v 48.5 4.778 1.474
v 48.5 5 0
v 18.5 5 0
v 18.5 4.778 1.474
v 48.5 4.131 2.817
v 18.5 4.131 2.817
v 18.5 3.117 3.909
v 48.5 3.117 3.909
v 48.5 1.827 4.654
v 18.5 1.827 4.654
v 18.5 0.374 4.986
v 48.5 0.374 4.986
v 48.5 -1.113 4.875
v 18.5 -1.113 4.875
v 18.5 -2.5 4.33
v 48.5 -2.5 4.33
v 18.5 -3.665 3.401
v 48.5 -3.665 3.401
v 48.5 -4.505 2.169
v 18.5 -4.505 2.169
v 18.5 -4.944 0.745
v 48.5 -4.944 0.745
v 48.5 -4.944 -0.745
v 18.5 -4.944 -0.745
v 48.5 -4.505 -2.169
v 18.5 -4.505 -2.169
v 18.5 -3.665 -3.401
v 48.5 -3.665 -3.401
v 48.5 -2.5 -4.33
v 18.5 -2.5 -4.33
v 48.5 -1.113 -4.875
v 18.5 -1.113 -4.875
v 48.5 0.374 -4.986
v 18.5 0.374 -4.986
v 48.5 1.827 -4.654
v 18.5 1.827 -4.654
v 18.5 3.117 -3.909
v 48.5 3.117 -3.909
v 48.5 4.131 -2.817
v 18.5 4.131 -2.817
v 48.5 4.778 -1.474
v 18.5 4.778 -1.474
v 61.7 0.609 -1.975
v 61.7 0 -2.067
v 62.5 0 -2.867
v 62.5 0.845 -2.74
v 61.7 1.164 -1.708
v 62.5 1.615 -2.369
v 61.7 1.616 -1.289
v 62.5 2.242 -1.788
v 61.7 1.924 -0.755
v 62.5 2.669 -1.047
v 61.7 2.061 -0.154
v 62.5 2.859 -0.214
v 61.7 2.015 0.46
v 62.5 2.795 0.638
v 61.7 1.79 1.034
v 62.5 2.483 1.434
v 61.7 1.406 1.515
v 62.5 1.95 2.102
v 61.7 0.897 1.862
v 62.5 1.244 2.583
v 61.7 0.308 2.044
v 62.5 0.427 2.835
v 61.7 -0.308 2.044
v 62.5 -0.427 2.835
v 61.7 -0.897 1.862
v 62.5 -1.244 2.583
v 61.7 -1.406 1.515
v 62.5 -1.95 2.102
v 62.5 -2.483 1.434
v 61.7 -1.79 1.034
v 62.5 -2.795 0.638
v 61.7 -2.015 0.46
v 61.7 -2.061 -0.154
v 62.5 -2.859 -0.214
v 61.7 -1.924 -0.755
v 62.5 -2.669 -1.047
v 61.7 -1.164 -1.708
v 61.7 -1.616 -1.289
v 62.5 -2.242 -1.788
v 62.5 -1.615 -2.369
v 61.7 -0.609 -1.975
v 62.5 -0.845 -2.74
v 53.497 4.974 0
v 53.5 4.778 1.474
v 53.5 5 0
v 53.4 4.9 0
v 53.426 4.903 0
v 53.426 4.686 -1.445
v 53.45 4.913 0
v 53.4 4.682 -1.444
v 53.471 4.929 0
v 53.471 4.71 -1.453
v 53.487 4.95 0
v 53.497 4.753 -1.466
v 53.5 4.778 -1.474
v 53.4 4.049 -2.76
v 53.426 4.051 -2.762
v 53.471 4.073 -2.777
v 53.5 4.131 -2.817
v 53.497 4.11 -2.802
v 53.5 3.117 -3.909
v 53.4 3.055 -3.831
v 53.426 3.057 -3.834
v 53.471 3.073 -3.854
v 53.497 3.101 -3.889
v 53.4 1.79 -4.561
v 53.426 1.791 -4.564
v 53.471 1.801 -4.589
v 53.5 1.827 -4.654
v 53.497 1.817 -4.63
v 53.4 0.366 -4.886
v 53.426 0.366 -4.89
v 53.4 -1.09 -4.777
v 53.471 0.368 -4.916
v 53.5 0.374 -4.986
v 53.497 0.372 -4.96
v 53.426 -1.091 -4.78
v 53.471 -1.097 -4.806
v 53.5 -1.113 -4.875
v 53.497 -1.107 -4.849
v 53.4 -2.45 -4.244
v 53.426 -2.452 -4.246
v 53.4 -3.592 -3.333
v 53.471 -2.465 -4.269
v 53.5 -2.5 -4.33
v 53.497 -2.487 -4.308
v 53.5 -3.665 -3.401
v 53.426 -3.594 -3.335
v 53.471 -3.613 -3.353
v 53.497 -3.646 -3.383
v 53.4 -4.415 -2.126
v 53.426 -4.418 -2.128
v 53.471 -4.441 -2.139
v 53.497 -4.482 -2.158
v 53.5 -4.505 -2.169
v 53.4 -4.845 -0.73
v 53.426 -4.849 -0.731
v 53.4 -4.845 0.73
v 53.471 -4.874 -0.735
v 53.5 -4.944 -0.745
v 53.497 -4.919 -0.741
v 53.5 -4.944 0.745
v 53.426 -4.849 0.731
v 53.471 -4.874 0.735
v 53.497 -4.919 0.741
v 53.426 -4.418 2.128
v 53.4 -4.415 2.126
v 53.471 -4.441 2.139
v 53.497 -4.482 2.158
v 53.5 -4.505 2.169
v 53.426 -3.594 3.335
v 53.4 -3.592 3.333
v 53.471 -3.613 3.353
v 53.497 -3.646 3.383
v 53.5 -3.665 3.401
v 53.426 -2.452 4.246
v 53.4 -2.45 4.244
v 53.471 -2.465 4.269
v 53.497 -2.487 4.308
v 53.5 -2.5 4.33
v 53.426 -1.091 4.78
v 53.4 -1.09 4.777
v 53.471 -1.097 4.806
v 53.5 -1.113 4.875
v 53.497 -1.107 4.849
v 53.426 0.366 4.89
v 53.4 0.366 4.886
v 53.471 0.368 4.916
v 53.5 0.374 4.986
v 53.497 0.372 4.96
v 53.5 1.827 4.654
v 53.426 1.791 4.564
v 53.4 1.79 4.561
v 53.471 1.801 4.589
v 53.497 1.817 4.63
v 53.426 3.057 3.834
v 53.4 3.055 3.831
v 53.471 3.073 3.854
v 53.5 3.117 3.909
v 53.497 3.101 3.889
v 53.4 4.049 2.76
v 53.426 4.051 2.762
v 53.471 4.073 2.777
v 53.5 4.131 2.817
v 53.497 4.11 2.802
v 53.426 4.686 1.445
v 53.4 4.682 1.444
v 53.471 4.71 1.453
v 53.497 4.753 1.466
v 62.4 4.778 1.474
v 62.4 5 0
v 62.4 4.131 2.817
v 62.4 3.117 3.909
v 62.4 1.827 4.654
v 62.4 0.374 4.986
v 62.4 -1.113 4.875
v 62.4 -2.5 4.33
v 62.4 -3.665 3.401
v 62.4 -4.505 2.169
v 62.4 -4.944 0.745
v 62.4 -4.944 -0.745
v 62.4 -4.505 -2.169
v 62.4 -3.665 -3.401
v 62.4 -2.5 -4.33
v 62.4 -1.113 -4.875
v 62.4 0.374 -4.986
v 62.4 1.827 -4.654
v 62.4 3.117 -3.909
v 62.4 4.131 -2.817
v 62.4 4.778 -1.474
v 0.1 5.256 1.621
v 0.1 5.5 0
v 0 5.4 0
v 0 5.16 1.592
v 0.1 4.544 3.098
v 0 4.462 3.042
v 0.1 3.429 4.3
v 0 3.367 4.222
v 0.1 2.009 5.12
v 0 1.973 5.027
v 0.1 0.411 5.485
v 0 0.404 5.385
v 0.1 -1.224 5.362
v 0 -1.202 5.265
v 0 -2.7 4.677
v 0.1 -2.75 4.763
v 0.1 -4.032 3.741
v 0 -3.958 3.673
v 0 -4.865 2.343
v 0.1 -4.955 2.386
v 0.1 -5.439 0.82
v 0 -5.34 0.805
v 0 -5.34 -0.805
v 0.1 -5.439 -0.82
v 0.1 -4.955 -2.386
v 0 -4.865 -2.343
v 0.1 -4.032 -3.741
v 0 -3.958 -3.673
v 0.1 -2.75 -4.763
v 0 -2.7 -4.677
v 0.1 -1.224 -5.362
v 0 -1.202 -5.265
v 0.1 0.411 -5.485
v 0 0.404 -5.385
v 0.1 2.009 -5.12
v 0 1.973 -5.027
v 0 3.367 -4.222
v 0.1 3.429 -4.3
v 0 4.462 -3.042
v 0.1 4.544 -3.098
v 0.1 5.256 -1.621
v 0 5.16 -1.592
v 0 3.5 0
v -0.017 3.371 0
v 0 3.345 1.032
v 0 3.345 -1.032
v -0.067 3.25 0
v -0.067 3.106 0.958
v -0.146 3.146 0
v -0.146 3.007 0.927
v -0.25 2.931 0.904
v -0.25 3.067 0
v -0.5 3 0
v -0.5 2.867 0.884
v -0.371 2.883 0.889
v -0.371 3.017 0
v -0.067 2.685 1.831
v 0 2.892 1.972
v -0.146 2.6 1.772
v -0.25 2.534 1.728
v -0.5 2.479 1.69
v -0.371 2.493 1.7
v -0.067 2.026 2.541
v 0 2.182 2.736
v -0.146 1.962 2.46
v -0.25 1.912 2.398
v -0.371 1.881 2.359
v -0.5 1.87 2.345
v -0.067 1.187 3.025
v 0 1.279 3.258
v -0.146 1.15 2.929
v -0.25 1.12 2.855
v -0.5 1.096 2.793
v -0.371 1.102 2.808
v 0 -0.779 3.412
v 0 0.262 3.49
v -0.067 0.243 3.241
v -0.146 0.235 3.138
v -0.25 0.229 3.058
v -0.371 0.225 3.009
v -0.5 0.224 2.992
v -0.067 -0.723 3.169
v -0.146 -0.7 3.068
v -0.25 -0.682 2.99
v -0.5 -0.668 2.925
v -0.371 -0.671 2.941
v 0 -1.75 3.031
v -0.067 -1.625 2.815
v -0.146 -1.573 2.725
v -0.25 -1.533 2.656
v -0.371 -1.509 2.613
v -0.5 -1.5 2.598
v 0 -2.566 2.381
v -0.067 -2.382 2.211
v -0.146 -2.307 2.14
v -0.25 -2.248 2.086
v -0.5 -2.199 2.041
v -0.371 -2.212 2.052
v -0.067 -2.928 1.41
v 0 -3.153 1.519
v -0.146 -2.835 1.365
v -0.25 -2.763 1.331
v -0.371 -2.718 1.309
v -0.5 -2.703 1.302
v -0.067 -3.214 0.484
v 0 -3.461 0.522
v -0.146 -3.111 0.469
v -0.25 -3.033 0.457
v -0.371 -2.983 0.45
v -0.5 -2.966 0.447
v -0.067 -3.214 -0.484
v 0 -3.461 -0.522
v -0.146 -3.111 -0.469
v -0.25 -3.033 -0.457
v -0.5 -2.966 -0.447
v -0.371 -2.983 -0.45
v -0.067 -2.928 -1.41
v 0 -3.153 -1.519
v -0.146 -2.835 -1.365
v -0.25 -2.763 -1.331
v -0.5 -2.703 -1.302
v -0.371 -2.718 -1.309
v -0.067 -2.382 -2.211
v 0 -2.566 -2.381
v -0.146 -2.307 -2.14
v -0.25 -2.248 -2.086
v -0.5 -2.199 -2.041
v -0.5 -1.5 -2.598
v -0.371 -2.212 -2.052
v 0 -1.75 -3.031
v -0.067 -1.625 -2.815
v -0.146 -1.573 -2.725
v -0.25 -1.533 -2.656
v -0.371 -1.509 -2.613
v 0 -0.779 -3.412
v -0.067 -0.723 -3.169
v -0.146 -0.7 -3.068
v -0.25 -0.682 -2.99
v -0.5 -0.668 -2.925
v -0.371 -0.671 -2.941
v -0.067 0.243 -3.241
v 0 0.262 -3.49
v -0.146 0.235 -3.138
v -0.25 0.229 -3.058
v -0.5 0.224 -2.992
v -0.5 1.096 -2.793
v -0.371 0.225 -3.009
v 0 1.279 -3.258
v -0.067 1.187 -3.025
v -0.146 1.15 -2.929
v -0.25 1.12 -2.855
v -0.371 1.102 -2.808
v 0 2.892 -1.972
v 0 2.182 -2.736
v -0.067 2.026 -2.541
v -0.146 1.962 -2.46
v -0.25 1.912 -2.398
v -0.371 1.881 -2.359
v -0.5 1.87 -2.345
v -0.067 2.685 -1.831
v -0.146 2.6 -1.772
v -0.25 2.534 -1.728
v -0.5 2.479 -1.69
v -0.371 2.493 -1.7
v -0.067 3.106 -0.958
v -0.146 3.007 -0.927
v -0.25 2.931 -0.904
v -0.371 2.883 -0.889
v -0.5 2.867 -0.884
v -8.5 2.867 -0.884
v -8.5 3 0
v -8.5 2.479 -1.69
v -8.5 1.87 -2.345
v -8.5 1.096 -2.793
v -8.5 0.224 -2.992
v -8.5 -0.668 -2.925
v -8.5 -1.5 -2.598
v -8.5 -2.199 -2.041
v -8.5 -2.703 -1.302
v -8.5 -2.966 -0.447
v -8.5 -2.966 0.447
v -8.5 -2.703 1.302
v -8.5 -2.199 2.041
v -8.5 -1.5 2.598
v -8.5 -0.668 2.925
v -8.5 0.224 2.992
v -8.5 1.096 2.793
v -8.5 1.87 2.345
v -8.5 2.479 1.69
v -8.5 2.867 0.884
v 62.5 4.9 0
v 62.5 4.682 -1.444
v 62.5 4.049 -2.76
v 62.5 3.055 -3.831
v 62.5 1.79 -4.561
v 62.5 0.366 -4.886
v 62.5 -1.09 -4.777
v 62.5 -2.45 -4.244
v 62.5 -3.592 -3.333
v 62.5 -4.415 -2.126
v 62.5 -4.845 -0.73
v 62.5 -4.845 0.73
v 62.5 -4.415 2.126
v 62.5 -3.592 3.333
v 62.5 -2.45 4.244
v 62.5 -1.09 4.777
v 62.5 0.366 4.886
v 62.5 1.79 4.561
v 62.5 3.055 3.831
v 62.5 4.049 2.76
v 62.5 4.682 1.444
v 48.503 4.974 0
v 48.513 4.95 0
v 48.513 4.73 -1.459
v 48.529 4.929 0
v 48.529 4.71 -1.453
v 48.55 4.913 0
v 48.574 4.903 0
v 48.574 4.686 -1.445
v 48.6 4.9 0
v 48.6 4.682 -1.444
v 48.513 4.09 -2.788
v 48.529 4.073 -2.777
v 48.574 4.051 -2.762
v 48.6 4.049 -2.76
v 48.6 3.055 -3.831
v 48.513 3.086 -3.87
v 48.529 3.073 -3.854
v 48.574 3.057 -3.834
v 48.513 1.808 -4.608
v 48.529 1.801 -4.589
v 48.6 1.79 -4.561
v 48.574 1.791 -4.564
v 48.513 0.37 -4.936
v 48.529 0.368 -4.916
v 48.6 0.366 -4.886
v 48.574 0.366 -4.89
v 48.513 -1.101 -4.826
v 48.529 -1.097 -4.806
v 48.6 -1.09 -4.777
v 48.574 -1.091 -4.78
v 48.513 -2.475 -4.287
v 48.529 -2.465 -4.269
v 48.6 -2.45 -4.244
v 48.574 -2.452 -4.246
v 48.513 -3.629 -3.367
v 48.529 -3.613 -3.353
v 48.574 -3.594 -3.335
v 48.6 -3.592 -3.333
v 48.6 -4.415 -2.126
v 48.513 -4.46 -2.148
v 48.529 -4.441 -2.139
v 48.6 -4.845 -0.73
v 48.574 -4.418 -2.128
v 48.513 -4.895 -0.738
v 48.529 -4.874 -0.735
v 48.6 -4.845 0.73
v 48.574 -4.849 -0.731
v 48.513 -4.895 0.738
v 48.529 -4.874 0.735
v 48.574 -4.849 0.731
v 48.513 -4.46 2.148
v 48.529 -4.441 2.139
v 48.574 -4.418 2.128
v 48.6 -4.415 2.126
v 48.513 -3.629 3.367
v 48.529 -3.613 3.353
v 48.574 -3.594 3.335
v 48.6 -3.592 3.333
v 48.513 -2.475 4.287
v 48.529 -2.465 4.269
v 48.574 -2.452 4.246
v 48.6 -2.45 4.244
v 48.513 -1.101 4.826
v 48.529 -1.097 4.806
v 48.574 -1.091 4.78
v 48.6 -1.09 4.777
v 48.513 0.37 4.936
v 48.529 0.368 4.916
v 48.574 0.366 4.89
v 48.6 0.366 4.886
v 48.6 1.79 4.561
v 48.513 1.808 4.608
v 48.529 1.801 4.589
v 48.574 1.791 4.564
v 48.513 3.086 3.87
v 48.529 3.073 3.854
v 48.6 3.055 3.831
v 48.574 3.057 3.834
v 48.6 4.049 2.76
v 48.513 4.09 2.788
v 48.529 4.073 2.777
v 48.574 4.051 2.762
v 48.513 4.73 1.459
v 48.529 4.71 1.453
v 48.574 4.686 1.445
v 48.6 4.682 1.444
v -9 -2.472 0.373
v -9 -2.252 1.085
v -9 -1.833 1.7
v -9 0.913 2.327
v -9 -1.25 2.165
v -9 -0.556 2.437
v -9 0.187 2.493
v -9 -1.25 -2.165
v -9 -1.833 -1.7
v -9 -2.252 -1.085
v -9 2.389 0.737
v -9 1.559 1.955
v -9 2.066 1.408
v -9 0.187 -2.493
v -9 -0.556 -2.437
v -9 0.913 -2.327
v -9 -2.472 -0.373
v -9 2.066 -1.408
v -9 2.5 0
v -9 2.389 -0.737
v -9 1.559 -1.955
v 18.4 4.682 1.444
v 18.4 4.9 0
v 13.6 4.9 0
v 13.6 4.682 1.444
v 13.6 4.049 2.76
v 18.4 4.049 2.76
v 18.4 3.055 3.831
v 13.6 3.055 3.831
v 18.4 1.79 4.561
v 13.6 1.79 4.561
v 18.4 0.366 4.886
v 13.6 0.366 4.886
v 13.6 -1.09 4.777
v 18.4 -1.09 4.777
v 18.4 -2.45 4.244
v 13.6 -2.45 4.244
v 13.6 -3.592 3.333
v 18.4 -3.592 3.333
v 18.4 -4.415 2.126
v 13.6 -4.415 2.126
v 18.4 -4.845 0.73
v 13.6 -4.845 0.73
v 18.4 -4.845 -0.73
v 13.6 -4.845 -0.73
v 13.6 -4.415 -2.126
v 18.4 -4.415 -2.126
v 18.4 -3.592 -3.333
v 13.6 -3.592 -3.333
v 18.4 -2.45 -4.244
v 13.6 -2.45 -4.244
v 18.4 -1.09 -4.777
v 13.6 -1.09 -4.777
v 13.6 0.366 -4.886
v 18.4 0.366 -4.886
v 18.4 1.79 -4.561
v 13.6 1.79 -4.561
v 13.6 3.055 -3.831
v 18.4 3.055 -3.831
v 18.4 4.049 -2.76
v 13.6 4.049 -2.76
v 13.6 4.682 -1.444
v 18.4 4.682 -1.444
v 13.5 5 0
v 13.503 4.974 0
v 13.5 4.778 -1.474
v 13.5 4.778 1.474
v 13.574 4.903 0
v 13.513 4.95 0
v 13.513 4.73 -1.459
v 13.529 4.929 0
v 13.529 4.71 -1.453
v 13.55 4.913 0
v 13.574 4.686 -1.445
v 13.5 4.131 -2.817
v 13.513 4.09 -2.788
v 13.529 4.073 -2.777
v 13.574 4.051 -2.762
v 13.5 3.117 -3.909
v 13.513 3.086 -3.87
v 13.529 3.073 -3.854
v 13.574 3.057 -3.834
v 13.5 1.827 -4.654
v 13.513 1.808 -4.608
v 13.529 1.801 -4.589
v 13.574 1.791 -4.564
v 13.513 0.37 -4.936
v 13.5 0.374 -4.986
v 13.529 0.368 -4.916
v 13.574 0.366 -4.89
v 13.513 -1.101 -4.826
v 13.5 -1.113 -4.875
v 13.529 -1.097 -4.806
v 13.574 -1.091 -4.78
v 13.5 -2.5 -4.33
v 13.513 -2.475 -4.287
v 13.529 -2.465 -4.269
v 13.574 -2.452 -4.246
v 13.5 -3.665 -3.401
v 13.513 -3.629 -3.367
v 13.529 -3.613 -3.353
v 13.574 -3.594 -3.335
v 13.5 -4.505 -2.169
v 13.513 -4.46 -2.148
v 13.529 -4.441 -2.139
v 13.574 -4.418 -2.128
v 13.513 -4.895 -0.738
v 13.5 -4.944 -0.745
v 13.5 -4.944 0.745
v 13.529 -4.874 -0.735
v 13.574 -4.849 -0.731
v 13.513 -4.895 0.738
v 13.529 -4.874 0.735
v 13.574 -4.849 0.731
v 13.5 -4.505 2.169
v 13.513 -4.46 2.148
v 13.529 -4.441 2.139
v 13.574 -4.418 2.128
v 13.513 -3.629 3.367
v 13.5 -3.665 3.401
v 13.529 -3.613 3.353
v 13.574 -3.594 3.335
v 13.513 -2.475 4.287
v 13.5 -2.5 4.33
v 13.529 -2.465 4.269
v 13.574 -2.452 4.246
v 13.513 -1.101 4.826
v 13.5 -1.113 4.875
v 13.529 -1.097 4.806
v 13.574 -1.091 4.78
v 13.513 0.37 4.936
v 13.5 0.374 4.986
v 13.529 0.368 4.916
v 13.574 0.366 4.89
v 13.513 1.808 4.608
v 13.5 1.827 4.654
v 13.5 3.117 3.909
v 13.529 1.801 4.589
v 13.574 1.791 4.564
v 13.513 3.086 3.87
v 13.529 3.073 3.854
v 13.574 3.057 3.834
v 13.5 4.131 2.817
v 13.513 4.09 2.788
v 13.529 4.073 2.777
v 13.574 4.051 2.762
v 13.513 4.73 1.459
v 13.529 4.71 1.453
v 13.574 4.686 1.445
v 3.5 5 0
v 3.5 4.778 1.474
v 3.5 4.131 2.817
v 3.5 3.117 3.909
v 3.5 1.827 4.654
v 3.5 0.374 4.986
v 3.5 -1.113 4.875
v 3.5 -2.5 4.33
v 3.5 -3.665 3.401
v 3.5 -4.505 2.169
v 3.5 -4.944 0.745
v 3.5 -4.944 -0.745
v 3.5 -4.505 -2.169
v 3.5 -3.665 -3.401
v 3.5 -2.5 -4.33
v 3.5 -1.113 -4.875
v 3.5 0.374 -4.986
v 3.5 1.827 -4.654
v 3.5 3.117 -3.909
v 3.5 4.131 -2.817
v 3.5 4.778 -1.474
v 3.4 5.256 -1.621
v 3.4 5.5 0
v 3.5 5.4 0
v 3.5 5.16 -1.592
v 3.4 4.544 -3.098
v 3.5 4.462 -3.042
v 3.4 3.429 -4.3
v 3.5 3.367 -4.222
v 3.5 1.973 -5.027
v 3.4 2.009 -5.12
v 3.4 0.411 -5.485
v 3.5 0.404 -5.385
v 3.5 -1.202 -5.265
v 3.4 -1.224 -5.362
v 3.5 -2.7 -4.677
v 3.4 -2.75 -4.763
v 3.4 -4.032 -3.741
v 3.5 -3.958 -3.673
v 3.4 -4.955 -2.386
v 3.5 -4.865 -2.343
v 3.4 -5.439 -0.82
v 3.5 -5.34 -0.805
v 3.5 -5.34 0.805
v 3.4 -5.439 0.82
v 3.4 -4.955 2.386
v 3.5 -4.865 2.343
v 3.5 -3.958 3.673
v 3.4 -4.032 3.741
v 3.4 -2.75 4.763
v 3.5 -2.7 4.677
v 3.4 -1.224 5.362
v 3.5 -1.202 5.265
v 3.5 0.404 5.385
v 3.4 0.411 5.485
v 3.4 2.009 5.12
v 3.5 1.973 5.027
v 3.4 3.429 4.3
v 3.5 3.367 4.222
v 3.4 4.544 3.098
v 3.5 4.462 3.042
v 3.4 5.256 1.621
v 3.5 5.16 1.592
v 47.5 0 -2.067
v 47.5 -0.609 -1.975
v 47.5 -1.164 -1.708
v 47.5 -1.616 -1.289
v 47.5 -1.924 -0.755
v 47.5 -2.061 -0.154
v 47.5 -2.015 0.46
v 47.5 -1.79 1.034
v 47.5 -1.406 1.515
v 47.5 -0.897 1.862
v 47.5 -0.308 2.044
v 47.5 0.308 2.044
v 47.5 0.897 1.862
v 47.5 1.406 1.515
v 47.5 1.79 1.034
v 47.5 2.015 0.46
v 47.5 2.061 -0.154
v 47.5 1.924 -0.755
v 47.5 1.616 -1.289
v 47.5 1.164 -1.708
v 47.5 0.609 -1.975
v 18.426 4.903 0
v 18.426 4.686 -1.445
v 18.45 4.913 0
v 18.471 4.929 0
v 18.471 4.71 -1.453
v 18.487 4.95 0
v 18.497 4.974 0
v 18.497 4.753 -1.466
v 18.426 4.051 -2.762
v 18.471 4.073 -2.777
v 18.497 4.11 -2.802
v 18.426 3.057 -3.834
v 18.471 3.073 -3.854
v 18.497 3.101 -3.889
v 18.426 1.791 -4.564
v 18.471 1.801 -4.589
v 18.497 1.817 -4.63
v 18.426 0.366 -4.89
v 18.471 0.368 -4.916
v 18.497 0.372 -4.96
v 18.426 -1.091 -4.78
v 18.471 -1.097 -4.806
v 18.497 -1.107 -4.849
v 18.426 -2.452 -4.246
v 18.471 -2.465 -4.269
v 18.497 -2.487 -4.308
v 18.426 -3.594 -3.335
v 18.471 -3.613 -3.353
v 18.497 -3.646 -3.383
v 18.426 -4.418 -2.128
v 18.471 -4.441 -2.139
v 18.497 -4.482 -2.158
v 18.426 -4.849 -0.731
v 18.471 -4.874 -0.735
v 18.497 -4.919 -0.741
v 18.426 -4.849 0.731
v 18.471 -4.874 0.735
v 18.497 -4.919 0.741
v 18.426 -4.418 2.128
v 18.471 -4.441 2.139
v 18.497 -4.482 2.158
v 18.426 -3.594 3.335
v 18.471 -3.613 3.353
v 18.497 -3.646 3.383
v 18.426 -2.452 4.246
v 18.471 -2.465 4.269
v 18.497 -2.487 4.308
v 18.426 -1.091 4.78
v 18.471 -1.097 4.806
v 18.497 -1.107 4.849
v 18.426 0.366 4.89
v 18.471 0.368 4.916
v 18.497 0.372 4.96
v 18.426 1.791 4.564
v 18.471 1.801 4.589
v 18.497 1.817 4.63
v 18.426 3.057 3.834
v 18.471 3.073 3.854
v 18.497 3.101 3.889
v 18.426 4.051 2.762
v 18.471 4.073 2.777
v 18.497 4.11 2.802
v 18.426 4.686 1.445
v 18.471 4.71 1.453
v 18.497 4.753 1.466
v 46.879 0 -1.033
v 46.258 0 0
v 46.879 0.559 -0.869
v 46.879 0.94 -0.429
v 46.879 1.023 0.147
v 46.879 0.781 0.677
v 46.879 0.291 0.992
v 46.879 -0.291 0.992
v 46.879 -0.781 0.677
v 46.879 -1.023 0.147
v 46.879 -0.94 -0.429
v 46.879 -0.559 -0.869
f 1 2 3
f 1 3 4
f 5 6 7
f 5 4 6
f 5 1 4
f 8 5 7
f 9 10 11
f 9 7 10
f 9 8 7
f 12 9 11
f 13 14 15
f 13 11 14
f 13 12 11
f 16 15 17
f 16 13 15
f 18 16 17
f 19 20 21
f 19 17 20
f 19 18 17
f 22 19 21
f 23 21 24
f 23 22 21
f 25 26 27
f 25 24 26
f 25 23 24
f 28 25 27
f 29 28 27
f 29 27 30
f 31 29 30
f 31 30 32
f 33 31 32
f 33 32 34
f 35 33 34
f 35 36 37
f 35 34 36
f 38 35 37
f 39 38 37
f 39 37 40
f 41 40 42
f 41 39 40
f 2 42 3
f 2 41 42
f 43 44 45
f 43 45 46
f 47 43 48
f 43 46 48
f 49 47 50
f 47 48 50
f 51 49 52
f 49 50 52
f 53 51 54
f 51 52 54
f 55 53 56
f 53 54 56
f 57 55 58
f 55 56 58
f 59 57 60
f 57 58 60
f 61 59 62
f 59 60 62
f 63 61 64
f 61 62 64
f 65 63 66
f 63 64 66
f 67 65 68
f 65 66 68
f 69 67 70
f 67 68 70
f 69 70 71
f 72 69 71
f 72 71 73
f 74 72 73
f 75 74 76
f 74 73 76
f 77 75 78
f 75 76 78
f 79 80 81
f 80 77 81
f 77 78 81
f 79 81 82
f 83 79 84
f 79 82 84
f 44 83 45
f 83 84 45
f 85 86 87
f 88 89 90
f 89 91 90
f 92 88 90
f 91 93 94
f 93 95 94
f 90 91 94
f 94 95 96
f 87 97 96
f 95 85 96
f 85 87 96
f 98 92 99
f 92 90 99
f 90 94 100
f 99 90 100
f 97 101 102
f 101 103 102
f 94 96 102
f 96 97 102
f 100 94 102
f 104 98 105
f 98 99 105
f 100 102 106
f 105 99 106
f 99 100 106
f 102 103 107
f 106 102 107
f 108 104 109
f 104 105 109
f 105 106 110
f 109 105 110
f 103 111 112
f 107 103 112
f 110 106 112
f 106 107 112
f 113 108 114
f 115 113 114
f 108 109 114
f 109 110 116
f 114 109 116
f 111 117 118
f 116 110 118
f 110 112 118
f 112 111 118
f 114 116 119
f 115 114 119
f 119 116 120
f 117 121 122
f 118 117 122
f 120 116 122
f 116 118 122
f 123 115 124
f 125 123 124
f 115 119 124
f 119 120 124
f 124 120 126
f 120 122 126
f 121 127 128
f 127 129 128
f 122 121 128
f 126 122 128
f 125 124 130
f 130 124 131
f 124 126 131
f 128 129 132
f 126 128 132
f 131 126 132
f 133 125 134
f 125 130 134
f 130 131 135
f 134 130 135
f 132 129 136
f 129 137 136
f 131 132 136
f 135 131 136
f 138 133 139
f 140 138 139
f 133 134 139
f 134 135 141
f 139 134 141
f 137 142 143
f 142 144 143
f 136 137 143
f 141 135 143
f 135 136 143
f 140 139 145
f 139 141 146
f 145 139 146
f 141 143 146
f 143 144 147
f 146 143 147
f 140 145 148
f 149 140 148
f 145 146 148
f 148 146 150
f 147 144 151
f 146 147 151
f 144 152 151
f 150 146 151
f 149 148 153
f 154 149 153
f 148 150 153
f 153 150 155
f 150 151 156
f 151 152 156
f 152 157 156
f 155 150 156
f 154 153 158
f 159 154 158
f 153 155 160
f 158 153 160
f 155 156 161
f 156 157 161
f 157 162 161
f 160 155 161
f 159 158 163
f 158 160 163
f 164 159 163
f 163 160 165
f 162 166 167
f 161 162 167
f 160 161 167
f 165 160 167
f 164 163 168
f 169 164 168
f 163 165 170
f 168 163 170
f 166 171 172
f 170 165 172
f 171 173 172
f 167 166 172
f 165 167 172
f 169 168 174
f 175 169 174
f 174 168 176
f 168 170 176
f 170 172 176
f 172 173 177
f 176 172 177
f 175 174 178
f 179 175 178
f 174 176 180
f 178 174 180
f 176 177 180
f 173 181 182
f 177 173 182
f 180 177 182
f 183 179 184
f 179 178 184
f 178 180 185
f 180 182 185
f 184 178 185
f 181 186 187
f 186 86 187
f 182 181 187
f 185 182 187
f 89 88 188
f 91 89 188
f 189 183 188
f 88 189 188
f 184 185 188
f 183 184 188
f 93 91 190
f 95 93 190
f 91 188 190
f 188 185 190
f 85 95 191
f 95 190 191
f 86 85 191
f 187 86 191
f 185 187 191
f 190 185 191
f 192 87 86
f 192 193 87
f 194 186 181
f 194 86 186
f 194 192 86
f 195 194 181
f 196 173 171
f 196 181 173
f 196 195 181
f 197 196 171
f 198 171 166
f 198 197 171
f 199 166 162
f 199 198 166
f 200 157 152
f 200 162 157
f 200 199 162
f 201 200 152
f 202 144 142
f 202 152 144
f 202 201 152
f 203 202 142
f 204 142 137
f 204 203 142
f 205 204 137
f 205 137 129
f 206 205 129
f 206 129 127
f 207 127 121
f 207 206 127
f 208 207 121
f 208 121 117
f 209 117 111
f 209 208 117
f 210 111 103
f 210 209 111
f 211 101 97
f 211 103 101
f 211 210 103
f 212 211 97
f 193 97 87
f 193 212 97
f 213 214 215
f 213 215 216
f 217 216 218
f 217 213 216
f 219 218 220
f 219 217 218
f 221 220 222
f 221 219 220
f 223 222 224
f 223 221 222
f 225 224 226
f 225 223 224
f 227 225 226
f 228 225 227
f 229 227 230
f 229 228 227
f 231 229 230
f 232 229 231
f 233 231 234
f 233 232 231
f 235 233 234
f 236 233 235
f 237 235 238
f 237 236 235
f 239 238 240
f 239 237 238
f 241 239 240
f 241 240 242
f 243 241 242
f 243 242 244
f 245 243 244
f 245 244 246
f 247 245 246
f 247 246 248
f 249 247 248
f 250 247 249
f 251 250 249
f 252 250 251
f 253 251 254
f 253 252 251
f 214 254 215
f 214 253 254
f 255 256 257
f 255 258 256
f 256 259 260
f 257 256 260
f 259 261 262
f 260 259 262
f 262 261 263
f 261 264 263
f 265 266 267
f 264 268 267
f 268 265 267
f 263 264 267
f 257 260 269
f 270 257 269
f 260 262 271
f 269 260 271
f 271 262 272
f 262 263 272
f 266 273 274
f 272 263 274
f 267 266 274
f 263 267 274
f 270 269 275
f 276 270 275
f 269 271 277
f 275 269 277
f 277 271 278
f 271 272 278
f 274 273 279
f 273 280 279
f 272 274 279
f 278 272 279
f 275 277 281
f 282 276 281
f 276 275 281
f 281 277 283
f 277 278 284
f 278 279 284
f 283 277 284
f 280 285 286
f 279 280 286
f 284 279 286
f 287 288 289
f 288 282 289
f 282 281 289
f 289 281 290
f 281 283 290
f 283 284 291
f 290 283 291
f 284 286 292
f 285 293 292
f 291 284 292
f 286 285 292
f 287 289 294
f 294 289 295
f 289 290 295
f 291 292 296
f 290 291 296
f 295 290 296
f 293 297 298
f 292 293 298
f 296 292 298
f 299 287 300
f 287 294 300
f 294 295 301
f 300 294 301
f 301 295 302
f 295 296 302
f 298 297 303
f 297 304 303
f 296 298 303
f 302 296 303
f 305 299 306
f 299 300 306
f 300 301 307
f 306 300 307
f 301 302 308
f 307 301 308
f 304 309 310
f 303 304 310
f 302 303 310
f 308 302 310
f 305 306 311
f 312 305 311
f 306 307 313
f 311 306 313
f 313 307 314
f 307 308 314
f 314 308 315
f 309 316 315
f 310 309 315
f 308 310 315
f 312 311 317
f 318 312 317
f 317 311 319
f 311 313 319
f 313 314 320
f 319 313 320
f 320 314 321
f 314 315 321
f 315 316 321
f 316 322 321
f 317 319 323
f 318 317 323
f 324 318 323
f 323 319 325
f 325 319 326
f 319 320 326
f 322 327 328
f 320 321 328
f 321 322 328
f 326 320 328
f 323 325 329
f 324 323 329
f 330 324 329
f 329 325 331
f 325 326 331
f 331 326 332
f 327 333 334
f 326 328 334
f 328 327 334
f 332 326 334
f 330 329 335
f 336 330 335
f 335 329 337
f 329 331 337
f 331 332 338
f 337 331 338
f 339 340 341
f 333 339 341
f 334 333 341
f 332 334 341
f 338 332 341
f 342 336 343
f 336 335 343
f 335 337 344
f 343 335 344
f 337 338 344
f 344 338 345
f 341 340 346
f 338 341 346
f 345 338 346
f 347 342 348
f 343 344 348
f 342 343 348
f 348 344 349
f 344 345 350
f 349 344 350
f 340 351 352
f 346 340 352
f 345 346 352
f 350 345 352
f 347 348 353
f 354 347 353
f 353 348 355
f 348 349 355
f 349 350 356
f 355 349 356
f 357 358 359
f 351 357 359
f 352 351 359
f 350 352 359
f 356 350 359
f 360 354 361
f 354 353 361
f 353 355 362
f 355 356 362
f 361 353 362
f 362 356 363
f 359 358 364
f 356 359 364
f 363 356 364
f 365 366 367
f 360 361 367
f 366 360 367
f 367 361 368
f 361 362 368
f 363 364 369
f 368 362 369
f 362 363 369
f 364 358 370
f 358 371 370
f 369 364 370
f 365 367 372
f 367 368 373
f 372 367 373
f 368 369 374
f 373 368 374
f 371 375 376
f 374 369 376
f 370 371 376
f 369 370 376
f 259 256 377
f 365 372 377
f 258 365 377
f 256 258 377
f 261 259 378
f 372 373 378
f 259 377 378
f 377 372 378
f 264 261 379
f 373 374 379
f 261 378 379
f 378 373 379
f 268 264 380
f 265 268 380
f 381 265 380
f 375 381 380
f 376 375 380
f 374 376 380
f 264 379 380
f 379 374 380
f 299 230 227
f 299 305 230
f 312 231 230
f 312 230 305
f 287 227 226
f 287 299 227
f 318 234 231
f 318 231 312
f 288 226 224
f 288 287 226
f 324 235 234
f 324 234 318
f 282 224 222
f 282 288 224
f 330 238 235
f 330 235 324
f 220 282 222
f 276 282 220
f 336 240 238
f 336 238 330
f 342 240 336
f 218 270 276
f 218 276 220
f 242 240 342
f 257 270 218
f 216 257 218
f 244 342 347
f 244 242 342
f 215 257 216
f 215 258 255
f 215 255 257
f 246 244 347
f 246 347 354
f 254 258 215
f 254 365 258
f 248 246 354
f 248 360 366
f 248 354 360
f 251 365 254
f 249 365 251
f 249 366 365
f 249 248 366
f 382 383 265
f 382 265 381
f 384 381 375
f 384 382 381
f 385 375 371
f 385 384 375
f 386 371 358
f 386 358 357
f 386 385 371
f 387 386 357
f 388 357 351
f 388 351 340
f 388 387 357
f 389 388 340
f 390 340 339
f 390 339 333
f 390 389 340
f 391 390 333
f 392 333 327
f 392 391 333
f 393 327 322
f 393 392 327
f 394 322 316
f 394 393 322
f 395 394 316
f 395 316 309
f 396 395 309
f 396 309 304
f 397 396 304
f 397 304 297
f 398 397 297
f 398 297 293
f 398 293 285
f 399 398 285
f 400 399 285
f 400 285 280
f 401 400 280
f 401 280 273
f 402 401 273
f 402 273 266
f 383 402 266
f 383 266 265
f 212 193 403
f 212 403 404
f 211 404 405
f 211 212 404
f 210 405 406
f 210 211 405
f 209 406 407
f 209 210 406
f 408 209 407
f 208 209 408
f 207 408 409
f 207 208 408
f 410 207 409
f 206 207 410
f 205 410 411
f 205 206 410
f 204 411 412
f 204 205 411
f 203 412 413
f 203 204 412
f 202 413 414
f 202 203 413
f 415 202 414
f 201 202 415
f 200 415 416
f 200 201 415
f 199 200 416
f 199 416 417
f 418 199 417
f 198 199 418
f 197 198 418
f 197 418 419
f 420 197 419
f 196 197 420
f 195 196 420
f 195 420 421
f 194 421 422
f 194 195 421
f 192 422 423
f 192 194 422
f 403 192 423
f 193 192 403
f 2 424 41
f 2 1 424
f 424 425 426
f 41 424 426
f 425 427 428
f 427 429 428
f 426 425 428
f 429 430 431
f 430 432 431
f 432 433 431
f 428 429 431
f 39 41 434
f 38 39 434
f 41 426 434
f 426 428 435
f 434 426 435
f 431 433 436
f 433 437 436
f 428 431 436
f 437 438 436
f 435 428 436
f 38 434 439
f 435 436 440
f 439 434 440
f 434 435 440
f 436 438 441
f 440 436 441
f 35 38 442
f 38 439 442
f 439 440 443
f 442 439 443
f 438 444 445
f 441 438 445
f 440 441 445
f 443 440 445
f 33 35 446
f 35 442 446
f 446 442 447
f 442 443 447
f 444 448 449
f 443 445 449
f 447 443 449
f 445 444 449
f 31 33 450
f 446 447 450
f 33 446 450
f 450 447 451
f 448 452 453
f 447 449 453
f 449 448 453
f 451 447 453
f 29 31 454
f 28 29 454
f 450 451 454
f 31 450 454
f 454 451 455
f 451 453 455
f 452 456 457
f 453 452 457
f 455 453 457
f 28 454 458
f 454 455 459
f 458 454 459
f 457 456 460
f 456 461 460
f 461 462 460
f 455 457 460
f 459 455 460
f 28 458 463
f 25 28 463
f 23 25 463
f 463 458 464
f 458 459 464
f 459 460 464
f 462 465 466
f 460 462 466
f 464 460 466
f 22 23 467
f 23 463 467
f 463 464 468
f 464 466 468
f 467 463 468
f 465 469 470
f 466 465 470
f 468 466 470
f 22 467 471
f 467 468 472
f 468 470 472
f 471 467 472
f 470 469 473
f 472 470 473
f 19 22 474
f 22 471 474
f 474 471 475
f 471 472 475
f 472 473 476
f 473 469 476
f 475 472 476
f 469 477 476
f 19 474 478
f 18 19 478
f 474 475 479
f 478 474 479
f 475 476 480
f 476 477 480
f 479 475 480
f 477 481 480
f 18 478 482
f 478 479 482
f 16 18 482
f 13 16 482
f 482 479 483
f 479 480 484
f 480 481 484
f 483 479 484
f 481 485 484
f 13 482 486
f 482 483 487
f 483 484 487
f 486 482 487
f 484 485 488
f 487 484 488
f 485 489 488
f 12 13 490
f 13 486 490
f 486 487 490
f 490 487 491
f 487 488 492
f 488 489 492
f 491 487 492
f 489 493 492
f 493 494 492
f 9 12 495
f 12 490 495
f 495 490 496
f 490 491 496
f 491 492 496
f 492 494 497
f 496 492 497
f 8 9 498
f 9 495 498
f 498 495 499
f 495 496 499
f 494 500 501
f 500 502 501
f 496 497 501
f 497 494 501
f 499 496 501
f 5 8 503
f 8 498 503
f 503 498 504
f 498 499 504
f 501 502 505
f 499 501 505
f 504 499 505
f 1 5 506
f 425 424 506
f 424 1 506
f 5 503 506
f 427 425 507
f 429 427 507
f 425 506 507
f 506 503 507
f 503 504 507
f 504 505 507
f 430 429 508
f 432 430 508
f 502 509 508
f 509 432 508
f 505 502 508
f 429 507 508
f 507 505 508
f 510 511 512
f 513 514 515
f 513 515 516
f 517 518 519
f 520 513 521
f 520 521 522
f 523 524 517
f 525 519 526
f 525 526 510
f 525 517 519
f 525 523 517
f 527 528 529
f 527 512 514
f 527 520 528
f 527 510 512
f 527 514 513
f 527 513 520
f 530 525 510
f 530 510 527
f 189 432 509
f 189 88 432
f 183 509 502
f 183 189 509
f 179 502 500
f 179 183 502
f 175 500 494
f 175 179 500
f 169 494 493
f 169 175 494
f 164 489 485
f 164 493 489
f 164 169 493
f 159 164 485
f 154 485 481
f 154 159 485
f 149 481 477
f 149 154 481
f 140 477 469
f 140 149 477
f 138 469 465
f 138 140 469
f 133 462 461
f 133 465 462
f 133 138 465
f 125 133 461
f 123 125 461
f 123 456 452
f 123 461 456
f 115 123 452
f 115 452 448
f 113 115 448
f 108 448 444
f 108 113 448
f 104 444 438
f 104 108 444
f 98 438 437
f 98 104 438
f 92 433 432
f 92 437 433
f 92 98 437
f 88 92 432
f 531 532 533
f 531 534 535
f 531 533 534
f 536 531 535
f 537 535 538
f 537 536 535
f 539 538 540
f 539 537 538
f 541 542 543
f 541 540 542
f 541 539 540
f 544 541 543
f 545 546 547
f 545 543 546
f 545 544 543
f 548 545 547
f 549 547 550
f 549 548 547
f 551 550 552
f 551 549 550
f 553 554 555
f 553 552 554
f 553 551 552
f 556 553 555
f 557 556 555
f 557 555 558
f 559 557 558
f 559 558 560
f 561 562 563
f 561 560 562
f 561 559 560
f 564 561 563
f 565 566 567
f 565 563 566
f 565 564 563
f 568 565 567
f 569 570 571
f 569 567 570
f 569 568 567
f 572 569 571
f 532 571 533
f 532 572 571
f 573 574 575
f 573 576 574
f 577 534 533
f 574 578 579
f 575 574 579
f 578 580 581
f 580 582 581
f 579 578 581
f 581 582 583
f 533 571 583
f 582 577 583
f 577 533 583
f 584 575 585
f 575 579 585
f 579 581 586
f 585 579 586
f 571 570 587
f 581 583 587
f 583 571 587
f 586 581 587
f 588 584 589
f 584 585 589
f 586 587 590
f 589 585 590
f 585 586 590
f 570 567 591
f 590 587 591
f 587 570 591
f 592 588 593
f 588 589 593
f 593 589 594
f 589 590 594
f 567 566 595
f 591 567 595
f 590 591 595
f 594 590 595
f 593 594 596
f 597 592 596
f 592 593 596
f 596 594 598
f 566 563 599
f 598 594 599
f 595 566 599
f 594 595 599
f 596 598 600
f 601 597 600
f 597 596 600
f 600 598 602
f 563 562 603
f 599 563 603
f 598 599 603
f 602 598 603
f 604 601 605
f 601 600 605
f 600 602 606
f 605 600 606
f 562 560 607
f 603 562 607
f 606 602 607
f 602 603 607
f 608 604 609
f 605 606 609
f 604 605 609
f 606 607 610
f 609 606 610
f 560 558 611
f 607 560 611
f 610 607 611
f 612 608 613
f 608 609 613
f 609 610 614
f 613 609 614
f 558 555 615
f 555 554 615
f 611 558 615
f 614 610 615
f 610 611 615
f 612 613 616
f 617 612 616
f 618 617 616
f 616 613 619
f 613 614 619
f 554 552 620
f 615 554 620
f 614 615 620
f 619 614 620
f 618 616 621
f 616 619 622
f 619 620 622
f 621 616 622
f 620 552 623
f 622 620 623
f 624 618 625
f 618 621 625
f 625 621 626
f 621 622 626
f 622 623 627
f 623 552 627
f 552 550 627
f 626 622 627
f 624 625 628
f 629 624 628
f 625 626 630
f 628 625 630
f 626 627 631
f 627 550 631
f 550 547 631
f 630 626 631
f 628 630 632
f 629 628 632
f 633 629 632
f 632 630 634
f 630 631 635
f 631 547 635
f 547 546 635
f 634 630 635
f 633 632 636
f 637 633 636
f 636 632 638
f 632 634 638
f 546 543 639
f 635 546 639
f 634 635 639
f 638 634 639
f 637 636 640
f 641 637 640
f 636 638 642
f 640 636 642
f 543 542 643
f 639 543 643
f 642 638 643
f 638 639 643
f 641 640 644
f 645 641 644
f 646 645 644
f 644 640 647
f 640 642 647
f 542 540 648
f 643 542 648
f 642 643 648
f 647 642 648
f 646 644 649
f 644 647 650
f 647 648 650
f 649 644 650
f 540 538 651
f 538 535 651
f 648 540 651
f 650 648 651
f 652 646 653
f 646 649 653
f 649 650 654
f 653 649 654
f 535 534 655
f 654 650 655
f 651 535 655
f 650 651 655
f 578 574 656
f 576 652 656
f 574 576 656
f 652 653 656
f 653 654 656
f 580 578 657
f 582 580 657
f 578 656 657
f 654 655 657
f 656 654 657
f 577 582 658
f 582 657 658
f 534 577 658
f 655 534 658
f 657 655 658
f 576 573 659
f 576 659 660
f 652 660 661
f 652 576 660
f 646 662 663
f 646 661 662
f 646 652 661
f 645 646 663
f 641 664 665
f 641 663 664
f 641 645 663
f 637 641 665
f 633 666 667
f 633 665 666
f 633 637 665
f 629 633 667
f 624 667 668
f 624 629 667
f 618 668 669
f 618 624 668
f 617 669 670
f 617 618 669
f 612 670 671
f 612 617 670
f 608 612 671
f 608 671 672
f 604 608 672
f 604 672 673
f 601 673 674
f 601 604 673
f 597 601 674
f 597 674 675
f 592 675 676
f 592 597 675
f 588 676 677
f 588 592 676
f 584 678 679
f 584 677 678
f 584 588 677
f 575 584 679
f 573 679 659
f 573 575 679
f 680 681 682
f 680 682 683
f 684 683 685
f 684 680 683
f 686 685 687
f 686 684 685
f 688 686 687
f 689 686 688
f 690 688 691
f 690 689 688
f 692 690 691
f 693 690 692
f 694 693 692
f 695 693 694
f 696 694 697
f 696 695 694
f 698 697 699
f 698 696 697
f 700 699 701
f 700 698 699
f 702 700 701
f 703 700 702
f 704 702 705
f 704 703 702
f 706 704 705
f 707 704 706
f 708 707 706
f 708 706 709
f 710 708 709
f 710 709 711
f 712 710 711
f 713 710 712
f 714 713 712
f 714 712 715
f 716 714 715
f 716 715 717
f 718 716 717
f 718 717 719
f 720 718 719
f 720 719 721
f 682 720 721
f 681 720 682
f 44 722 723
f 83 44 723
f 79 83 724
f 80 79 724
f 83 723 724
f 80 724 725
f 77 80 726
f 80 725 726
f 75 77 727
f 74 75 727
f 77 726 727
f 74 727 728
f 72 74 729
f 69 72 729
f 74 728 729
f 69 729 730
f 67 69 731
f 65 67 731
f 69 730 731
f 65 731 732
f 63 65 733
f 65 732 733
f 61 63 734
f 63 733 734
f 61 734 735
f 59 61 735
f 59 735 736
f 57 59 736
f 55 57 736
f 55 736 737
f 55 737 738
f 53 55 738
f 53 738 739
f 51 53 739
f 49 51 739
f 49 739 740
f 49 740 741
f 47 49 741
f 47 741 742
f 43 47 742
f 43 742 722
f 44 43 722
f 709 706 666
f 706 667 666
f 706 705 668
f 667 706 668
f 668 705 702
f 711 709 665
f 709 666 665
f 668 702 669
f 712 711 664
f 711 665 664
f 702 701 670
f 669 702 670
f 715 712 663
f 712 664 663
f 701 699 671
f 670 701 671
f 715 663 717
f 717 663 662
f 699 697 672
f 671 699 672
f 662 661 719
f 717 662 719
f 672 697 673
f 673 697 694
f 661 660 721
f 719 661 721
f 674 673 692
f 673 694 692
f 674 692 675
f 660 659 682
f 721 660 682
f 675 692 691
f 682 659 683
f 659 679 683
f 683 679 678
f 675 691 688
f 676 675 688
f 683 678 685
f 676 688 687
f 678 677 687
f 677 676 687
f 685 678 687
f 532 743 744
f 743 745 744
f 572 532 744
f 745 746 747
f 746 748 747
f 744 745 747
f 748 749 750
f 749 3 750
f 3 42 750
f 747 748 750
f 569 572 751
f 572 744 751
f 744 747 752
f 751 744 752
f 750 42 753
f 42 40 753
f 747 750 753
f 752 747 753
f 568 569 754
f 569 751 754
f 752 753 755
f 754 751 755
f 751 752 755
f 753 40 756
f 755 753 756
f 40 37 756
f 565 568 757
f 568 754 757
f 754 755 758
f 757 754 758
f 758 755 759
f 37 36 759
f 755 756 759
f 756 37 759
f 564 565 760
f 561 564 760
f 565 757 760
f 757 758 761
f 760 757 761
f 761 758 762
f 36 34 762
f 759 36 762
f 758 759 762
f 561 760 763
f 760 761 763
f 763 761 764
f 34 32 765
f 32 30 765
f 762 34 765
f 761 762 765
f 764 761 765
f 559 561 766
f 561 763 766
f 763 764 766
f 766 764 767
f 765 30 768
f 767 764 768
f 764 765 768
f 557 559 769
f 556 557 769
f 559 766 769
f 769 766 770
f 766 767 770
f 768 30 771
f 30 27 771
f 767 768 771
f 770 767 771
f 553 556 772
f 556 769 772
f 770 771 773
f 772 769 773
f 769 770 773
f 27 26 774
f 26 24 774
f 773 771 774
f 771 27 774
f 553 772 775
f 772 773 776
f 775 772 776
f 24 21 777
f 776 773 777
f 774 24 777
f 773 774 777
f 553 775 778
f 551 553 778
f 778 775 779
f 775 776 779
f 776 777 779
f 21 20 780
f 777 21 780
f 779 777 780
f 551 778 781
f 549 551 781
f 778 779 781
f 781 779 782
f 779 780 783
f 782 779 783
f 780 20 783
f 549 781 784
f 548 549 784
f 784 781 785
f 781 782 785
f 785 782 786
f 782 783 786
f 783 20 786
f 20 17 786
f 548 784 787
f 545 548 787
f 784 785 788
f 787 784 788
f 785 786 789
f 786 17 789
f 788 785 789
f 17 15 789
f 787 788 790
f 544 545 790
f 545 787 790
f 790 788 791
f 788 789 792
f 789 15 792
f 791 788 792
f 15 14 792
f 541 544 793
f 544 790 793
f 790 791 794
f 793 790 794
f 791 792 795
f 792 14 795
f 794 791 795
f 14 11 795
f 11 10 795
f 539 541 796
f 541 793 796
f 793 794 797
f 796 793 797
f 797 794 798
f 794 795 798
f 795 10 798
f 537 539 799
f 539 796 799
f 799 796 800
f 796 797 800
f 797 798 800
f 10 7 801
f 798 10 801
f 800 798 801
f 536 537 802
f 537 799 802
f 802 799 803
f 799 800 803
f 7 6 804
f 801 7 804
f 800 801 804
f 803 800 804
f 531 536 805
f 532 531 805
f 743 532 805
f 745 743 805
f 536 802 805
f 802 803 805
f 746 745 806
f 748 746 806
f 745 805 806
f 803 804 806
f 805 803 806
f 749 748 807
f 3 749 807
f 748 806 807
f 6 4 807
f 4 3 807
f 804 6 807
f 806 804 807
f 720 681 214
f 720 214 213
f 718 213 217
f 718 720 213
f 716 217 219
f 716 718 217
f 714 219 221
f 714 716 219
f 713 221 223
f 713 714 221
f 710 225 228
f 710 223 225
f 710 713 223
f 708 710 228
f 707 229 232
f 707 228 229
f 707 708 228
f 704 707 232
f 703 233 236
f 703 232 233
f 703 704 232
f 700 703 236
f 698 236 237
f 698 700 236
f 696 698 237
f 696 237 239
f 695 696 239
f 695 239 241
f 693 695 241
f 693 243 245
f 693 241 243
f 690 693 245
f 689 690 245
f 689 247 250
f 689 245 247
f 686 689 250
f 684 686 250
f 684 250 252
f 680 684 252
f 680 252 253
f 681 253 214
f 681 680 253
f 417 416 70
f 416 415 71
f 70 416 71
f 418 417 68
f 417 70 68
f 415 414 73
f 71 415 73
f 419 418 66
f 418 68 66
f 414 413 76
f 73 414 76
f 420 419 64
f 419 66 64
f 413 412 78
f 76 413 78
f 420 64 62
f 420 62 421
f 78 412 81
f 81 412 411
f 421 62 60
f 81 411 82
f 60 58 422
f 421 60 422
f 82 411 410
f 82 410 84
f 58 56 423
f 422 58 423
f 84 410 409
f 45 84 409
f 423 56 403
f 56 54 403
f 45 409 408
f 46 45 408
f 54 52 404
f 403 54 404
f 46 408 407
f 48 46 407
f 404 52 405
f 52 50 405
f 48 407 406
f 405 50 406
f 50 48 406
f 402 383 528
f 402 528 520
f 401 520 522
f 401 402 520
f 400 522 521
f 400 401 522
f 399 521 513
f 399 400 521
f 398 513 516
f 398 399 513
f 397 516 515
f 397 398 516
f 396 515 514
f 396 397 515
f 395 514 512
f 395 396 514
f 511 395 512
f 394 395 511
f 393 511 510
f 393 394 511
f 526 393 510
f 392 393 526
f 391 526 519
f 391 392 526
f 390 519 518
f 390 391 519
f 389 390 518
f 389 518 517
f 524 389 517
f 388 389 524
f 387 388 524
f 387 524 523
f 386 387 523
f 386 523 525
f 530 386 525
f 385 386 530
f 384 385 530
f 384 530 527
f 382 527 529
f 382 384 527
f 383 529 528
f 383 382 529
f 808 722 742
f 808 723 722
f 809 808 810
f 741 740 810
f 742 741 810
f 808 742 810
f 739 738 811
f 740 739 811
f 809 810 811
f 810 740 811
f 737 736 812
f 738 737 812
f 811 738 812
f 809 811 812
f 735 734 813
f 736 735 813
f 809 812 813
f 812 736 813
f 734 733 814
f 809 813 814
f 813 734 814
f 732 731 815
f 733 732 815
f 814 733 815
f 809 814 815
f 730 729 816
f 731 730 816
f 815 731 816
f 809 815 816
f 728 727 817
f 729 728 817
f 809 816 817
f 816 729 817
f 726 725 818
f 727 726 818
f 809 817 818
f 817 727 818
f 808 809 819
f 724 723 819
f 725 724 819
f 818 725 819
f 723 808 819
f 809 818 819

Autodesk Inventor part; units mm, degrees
ref_plane "YZ Plane" through (0, 0, 0) normal (1, 0, 0) x (0, 1, 0)
ref_plane "XZ Plane" through (0, 0, 0) normal (0, 1, 0) x (-1, 0, 0)
ref_plane "XY Plane" through (0, 0, 0) normal (0, 0, 1) x (1, 0, 0)
sketch "Skizze1" plane through (0, 0, 0) normal (0, 0, 1) x (1, 0, 0)
  line L0 (0, 5.5) -> (3.5, 5.5)
  line L1 (3.5, 5.5) -> (3.5, 5)
  line L2 (3.5, 5) -> (13.5, 5)
  line L3 (13.5, 5) -> (13.5, 5)
  line L4 (53.5, 5) -> (53.5, 5)
  line L5 (53.5, 5) -> (62.5, 5)
  line L6 (62.5, 0) -> (0, 0)
  line L7 (0, 3) -> (0, 5.5)
  arc A0 (13.5, 5) -> (13.6, 4.9) centre (13.6, 5) ccw
  arc A1 (53.4, 4.9) -> (53.5, 5) centre (53.4, 5) ccw
  line L8 (18.5, 5) -> (18.5, 5)
  line L9 (18.5, 5) -> (48.5, 5)
  line L10 (48.5, 5) -> (48.5, 5)
  line L11 (13.6, 4.9) -> (18.4, 4.9)
  line L12 (48.6, 4.9) -> (53.4, 4.9)
  arc A2 (18.4, 4.9) -> (18.5, 5) centre (18.4, 5) ccw
  arc A3 (48.5, 5) -> (48.6, 4.9) centre (48.6, 5) ccw
  line L13 (62.5, 5) -> (62.5, 0)
  line L14 (0, 3) -> (-9, 3)
  line L15 (-9, 3) -> (-9, 0)
  line L16 (-9, 0) -> (0, 0)
  line L17 (0, -16.1) -> (0, 16.1) construction
  line L18 (-0.5, -11.5) -> (-0.5, 11.5) projected
  point P0 (33.5, 5)
  dimension "d0" = 11
  dimension "d1" = 3.5
  dimension "YawnShaft_Diameter" = 10
  dimension "d4" = 13.5
  dimension "d7" = 0.1
  dimension "d13" = 9.8
  dimension "d14" = 10
  dimension "d16" = 30
  dimension "d17" = 40
  dimension "d18" = 5
  dimension "d19" = 0.1
  dimension "d49" = 5
  dimension "d51" = 62.5
  dimension "d52" = 59
  dimension "d54" = 30
  dimension "d57" = 6
  dimension "d63" = 8.5
  dimension "YawnFixation_Width" = 30.2
revolve "Grundprofil" add sketch "Skizze1" angle 360 about axis through (62.5, 0, 0) along (-1, 0, 0)
chamfer "Entgraten 0,1mm" distance 0.1 angle 45 3 edges at (0, -5.5, 0) (3.5, -5.5, 0) (62.5, -5, 0)
sketch "Skizze4" plane through (62.5, 0, 0) normal (1, 0, 0) x (0, 0, -1)
  point P0 (0, 0)
  point P1 (0, 0)
hole "Gewinde_Keine_ISO Metrisches Profil_5_Winkel" at (62.5, 0, 0) direction (-1, 0, 0) diameter 4.134 depth 15 tip angle 118 thread size "M5x0.8" class "6H" standard "ISO Metric profile"
chamfer "Gewindefase 0,8mm" distance 0.8 angle 45 1 edges at (62.5, 0, 2.067)
fillet "Kerbwirkungsreduktion 0,5mm" radius 0.5 1 edges at (0, -3, 0)
chamfer "Encoderschaft Fase 0,5mm" distance 0.5 angle 45 1 edges at (-9, -3, 0)
ref_plane "Work Plane1" through (33.5, 5, 0) normal (1, 0, 0) x (0, 1, 0)
equation "\"d7\" = d19"
equation "\"d18\" = -0.5 * d16 + 0.5 * d17"
equation "\"d19\" = -0.5 * d13 + 0.5 * YawnShaft_Diameter"
properties part number "Shoulder_Joint_Yawn_Shaft" material "Stahl, hochfest, niedrig legiert"
